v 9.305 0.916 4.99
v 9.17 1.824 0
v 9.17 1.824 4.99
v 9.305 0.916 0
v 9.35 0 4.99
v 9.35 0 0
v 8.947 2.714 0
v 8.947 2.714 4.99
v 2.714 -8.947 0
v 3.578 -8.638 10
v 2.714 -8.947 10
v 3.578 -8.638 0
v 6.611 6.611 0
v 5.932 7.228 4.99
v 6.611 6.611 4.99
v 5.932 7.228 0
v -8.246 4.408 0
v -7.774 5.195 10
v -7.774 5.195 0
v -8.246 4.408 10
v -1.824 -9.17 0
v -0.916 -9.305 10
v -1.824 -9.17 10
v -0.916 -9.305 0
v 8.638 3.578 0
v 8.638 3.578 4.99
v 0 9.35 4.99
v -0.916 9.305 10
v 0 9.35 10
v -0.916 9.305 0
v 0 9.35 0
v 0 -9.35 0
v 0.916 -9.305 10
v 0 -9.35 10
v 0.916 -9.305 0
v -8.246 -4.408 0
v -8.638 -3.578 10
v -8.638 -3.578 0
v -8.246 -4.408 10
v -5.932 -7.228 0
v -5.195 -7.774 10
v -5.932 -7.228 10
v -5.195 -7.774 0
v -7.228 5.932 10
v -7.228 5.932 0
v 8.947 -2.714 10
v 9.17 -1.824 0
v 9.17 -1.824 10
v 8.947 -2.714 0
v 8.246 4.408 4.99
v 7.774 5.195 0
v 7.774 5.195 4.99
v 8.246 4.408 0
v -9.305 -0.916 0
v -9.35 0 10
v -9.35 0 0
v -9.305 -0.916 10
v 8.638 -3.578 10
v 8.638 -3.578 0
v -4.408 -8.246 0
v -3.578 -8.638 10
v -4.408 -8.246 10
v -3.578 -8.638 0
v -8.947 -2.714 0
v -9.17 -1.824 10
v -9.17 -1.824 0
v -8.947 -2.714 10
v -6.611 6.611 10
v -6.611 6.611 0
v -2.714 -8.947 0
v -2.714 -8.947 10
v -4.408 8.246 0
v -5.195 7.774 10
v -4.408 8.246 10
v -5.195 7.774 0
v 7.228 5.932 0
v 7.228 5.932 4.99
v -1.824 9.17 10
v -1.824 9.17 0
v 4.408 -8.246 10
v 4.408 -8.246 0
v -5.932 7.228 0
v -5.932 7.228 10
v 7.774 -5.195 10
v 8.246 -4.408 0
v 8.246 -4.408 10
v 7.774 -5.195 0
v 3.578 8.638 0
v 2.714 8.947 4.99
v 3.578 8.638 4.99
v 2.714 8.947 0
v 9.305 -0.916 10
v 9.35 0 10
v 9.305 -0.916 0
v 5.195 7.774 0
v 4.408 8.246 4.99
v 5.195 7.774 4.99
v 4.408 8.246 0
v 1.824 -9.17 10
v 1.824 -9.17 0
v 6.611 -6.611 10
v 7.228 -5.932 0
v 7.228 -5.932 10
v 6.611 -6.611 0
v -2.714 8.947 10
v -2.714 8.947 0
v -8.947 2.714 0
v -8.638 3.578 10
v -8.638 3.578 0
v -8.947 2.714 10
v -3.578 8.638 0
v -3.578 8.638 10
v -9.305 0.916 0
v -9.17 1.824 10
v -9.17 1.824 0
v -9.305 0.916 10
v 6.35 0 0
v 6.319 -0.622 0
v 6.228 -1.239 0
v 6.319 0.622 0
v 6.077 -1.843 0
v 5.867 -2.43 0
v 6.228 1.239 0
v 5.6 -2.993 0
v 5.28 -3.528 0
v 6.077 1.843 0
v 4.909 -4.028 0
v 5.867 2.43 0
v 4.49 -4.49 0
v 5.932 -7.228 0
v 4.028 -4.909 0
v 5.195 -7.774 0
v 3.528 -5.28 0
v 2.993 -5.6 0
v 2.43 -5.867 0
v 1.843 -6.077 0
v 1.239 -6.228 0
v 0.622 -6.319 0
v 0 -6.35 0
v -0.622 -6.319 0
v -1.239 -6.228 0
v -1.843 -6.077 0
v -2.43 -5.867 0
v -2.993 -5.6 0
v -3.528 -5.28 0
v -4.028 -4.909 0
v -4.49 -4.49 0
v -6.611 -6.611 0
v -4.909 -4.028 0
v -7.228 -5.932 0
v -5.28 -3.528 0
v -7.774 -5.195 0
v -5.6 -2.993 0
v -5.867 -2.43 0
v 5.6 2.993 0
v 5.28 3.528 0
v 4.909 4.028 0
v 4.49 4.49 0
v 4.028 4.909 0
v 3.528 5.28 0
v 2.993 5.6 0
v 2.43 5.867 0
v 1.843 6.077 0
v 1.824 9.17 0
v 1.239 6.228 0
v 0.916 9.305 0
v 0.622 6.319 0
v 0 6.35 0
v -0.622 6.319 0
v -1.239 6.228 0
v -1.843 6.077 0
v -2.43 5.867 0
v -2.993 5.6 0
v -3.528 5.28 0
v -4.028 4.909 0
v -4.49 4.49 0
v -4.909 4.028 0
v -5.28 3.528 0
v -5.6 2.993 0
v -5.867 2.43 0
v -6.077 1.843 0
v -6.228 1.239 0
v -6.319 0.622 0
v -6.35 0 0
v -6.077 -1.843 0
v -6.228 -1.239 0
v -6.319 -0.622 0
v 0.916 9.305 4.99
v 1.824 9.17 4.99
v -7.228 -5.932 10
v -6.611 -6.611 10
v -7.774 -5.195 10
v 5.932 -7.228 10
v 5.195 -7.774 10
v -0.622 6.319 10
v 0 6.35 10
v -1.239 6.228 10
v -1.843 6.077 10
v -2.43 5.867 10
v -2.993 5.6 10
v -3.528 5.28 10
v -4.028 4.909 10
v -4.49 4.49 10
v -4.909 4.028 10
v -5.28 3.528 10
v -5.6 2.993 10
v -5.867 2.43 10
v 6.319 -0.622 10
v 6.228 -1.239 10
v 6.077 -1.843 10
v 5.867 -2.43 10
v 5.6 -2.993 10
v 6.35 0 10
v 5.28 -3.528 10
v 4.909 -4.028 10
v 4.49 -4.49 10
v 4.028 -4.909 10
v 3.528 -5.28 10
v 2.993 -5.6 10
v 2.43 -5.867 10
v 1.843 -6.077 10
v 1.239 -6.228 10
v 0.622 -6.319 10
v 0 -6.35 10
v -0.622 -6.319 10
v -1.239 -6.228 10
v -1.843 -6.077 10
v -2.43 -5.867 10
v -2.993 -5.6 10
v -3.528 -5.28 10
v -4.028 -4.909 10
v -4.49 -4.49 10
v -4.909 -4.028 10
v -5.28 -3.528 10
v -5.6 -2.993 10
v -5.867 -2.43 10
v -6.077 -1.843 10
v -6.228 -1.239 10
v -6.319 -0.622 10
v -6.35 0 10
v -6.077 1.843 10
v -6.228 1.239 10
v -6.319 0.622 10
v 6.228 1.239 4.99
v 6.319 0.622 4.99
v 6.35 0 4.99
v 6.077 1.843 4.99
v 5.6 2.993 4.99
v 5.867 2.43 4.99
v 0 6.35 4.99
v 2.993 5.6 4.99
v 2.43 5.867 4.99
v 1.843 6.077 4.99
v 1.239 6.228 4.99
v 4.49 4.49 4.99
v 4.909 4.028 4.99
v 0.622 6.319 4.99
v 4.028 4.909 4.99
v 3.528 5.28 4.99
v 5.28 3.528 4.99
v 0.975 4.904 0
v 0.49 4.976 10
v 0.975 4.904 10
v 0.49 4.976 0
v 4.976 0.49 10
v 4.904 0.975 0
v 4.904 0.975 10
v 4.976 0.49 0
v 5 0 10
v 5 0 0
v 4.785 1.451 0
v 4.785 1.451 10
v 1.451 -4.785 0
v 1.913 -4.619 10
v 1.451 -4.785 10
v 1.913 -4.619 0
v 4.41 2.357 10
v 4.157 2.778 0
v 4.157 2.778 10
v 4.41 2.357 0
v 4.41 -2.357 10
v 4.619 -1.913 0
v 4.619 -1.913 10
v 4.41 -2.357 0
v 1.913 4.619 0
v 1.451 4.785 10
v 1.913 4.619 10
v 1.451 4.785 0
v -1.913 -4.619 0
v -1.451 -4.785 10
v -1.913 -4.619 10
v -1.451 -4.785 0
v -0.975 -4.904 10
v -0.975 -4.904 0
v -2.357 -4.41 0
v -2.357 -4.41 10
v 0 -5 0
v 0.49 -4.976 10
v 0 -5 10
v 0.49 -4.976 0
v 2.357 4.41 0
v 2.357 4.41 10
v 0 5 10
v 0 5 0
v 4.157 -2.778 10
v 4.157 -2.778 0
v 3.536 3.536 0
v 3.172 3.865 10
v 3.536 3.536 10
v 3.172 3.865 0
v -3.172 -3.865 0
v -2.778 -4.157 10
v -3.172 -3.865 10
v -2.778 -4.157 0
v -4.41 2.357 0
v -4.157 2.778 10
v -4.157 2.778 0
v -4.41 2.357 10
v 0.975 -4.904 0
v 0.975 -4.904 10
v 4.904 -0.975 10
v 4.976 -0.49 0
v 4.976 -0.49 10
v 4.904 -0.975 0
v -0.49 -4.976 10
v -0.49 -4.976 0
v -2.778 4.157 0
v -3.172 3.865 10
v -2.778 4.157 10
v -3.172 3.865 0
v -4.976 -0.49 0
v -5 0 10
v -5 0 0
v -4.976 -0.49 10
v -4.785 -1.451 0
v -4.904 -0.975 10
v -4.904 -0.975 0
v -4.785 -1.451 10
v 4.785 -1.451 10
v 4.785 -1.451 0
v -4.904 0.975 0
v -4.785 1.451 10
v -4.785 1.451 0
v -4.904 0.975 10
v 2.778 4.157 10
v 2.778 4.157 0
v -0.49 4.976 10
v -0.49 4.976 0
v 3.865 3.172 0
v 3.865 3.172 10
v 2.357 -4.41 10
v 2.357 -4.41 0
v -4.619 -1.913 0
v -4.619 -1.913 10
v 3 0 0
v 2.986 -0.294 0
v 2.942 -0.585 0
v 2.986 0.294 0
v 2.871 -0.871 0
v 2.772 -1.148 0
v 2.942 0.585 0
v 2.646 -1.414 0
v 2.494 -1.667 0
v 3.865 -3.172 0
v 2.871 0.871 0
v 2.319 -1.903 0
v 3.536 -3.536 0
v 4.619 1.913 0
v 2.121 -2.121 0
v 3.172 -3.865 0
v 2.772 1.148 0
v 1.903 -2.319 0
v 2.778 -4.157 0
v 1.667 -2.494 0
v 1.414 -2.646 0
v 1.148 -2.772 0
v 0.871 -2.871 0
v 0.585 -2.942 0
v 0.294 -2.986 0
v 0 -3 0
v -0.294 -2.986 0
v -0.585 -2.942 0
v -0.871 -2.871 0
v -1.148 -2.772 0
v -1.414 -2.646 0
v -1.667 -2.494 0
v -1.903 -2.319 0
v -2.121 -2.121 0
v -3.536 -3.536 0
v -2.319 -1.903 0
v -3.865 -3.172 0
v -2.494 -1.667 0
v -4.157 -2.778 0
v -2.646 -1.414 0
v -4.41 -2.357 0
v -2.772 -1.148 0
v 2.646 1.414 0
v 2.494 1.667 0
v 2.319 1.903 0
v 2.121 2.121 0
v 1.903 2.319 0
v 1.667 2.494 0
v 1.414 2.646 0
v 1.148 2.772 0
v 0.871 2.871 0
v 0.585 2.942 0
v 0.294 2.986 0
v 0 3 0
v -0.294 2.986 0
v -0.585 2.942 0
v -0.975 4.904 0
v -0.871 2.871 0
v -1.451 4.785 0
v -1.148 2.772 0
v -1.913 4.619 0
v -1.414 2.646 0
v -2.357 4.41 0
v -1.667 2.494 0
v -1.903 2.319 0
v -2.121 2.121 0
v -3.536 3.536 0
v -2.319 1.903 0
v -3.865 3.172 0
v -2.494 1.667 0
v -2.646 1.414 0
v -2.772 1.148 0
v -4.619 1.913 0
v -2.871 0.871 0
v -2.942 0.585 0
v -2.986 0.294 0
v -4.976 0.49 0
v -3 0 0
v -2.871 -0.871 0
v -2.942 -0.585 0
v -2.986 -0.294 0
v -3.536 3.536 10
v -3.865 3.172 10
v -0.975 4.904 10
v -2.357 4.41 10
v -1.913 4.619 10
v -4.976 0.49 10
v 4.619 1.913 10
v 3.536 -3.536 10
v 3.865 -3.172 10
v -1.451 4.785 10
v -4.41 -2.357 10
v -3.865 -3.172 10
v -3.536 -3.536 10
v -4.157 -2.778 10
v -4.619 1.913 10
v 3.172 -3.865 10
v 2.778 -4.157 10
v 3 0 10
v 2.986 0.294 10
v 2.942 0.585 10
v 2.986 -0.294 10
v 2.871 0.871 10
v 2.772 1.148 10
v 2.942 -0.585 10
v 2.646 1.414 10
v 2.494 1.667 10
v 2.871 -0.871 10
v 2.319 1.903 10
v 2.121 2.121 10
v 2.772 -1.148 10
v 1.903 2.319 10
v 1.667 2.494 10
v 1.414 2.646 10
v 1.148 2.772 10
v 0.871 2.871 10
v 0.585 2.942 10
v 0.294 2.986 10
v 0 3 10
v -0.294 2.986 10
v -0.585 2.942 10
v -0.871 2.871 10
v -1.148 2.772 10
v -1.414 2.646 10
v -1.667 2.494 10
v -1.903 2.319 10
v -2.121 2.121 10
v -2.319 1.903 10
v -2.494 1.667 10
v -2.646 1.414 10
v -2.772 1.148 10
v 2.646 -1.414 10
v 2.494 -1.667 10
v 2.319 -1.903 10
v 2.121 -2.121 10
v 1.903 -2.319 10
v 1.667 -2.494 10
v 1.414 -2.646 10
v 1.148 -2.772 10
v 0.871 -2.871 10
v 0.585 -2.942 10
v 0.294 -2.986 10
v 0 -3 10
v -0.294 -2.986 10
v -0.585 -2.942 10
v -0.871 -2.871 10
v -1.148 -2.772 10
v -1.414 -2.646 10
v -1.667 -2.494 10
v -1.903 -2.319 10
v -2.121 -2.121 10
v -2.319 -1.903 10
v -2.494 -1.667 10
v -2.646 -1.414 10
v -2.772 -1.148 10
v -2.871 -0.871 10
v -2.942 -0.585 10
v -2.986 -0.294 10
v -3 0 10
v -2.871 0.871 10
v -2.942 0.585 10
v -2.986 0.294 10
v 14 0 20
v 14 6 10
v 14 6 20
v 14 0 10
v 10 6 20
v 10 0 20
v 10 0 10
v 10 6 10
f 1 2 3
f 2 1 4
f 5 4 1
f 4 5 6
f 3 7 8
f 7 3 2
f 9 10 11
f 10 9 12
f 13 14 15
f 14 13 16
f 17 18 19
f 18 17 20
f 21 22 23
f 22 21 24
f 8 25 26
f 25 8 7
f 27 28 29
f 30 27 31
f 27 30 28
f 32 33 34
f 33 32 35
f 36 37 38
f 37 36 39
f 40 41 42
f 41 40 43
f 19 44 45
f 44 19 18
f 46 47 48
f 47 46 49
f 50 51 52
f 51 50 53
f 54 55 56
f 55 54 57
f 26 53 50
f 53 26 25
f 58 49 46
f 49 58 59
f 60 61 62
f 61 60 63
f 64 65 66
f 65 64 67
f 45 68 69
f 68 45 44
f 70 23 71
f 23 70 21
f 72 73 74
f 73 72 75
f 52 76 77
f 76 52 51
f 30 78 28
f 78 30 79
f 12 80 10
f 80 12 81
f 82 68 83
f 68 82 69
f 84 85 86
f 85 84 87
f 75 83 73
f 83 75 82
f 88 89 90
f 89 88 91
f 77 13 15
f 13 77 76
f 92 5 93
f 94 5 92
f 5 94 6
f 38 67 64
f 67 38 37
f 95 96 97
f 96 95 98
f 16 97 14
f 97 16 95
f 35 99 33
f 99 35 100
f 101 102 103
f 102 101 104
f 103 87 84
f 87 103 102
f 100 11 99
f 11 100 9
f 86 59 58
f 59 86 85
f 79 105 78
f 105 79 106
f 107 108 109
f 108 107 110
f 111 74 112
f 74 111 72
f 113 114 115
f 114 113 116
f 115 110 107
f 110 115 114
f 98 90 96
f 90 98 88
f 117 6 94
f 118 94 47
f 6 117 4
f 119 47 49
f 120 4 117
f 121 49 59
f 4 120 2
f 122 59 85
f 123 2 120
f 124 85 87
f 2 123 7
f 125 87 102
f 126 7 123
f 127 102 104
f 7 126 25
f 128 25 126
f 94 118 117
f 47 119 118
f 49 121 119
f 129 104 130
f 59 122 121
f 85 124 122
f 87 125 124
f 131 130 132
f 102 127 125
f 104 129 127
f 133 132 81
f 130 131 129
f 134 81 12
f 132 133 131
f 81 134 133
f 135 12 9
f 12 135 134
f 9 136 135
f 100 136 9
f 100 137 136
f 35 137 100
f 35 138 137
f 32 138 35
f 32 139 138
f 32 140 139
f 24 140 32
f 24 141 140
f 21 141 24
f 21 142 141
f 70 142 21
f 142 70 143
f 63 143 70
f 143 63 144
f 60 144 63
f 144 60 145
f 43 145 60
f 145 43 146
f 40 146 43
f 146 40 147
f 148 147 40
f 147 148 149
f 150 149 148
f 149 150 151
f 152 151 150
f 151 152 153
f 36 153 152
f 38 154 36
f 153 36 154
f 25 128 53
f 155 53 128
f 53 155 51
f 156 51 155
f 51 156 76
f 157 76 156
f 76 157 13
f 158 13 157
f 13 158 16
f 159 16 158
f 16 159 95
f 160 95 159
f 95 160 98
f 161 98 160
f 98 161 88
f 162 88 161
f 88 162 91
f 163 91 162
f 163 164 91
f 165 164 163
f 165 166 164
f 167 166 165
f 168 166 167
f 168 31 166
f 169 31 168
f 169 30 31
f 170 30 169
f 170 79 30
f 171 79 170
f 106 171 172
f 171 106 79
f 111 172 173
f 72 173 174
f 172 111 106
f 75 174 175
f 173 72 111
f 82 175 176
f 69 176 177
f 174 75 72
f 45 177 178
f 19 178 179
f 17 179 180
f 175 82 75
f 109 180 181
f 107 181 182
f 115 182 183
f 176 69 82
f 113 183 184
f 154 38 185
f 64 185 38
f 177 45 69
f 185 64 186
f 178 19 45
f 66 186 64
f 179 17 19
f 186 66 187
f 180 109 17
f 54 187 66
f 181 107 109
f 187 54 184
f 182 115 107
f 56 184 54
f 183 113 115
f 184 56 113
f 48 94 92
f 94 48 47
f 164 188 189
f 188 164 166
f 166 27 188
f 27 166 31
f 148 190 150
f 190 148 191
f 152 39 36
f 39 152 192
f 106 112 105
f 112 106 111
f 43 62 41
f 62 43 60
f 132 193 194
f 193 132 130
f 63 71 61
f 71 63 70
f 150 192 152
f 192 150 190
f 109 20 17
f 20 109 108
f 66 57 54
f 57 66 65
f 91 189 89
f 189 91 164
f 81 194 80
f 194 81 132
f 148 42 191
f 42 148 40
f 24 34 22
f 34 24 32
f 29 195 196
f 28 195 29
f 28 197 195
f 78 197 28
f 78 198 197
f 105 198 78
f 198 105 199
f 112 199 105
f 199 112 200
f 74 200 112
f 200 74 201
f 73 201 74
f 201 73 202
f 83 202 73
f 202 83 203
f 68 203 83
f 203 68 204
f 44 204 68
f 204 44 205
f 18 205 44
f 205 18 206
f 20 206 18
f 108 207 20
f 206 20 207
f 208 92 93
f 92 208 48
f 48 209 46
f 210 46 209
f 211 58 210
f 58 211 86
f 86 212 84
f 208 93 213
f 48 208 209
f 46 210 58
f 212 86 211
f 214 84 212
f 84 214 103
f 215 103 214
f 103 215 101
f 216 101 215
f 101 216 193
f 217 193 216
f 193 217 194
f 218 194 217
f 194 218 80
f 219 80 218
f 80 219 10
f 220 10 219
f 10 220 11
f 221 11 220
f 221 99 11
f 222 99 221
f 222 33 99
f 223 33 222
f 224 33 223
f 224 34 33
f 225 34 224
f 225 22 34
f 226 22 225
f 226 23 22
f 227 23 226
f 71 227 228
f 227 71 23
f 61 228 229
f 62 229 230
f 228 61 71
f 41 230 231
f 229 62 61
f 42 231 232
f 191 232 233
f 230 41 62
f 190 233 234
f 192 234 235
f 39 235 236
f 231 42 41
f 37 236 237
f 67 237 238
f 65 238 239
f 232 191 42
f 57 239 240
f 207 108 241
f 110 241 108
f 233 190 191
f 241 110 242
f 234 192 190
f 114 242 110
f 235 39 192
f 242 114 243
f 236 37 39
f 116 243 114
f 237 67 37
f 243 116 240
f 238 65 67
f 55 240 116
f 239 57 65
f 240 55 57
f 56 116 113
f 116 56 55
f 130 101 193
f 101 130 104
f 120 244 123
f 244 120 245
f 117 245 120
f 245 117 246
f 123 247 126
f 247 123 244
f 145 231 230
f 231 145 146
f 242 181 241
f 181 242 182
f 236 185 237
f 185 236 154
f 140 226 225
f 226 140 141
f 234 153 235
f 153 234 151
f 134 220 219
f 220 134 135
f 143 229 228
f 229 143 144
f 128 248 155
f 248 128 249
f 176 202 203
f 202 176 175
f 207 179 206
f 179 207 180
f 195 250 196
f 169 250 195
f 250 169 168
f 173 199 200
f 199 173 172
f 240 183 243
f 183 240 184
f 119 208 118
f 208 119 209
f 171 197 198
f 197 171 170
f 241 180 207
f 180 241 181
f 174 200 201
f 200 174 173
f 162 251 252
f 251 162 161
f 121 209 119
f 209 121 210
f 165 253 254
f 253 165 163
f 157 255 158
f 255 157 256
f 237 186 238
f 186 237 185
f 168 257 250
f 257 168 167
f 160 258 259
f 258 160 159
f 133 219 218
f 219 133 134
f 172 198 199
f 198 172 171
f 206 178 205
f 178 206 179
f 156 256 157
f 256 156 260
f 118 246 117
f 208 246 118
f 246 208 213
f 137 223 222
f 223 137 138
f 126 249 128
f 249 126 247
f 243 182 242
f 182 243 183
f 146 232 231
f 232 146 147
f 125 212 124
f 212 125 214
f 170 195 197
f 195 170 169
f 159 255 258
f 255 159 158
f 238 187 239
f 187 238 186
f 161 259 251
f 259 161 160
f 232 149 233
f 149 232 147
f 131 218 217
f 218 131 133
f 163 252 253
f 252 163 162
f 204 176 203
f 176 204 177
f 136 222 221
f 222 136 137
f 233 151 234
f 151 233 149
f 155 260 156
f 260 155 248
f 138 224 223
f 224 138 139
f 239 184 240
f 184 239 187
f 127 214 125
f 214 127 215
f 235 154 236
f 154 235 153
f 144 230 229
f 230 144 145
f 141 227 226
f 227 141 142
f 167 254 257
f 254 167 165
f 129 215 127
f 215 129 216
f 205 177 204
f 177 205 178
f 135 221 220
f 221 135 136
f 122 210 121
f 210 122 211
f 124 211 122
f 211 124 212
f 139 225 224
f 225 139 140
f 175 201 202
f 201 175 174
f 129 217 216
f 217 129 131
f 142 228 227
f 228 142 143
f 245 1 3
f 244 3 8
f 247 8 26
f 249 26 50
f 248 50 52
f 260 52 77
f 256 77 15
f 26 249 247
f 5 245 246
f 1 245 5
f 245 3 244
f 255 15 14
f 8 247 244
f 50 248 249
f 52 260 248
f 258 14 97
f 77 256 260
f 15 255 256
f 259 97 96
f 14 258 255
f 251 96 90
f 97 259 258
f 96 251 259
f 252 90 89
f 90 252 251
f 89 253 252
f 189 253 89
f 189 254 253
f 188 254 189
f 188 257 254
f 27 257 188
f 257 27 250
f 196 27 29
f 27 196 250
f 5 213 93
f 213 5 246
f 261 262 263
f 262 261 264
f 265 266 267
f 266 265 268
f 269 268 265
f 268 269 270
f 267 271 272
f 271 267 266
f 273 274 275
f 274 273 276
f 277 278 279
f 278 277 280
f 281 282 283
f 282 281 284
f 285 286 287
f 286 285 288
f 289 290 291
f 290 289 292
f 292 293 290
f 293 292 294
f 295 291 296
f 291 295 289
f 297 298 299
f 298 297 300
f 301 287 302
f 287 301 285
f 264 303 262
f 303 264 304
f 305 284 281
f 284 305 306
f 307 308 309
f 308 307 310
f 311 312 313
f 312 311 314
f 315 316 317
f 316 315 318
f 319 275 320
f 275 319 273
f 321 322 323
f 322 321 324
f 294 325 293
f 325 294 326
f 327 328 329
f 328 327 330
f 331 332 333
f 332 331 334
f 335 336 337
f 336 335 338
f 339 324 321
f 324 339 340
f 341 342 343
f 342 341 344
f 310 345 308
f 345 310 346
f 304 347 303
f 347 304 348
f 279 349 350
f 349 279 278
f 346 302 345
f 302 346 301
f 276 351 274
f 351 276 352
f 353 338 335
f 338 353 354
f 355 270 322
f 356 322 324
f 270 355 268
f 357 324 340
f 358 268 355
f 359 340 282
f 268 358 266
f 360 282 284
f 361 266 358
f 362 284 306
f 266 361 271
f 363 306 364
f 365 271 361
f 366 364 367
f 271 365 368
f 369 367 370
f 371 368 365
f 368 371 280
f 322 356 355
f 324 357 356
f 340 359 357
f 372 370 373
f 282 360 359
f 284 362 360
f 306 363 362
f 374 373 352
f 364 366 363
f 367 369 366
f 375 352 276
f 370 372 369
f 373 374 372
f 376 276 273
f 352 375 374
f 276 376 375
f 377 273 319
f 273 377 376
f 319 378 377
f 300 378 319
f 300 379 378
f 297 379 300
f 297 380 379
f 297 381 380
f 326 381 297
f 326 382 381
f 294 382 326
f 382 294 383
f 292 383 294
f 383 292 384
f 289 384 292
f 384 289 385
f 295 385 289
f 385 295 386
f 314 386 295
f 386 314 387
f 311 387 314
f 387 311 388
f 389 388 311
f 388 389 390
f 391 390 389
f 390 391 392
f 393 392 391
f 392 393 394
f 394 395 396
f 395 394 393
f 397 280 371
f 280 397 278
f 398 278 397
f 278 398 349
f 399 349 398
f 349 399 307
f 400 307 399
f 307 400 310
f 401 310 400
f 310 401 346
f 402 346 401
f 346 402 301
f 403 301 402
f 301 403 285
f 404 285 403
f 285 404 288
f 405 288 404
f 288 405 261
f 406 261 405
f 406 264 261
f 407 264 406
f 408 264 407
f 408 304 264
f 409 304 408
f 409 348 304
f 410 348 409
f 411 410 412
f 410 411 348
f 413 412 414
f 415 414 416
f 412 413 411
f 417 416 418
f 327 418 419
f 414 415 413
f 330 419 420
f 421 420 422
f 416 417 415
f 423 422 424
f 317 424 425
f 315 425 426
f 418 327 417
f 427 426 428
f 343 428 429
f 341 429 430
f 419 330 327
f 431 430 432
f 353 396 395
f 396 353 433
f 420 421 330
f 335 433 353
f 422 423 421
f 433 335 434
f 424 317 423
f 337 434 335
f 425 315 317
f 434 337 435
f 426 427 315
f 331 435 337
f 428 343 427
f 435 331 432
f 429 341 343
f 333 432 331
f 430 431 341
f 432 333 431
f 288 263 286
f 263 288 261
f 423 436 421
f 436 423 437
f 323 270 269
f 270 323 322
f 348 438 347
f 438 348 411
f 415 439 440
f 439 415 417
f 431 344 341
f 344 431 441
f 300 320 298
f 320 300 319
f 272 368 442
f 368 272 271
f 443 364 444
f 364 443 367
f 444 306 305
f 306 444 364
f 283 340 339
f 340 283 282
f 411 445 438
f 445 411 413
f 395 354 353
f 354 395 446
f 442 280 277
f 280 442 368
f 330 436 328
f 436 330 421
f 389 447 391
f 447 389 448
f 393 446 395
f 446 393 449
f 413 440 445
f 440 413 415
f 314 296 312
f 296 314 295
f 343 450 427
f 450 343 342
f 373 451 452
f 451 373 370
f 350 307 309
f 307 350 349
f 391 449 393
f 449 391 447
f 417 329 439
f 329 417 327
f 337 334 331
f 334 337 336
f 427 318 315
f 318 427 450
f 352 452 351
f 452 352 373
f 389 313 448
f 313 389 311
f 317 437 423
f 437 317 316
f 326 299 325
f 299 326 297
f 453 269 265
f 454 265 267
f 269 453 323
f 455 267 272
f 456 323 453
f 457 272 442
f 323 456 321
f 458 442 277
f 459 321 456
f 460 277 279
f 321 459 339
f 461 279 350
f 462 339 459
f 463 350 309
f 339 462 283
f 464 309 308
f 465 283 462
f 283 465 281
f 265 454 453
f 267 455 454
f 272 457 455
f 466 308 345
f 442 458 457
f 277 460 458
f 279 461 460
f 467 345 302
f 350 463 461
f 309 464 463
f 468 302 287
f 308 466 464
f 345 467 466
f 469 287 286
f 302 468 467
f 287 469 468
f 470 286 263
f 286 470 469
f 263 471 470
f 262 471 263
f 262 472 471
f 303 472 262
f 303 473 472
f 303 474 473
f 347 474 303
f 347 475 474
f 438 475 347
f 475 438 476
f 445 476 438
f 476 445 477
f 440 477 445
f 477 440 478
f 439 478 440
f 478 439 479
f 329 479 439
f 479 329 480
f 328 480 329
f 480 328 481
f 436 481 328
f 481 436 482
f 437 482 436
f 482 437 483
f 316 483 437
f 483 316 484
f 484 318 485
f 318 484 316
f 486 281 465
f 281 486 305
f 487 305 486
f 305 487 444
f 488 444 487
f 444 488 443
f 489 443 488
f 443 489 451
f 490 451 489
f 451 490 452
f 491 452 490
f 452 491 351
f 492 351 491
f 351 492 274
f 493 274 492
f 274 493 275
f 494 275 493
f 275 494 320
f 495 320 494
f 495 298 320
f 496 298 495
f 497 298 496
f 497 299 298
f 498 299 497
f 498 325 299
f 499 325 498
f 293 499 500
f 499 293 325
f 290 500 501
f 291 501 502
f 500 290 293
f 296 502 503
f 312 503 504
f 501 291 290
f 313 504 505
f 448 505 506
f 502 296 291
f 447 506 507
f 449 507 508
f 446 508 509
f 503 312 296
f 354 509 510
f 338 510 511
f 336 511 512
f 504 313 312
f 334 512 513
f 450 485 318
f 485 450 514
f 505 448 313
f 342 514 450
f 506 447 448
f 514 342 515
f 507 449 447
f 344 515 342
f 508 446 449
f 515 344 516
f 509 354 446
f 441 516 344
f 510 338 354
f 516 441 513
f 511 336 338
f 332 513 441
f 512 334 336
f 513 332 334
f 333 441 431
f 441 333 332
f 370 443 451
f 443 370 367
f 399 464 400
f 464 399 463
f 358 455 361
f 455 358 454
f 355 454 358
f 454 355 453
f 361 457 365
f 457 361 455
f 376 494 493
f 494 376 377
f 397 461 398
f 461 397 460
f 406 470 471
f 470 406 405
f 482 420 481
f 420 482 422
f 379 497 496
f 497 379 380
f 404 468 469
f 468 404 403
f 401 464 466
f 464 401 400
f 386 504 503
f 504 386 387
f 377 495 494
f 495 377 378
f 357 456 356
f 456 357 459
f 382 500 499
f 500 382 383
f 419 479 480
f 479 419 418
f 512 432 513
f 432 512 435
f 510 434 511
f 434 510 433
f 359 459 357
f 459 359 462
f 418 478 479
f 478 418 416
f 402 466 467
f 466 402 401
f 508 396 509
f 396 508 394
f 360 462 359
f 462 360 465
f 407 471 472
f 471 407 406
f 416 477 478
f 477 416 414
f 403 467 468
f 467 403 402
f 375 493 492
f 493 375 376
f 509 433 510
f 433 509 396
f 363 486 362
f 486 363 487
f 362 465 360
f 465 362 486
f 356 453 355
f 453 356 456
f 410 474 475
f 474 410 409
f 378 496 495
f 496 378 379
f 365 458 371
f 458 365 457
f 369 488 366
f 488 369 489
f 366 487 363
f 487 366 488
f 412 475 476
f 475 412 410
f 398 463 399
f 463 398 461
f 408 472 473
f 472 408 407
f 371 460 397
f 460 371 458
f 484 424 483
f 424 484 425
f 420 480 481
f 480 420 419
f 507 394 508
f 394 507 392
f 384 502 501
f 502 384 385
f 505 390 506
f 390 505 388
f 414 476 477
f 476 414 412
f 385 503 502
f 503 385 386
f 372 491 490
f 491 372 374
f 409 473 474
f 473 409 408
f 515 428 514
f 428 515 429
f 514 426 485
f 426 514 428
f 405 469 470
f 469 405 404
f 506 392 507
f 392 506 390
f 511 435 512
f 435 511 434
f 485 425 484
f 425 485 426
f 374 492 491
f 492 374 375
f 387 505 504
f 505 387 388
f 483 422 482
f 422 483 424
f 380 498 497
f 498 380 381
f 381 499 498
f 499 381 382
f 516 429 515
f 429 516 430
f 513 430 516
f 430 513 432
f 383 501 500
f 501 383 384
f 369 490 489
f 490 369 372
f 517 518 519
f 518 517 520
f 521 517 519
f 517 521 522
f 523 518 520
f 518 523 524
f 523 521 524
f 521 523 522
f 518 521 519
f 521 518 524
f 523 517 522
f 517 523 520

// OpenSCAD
$fn = 64;

// Dimensions
rod_diameter = 12.7;           // Inner diameter of rod ring
rod_wall = 3;                 // Wall thickness of rod ring
rod_outer_diameter = rod_diameter + 2 * rod_wall;  // 18.7 mm

tubing_inner_diameter = 6;  // Inner diameter of tubing ring
tubing_wall = 2;              // Wall thickness of tubing ring
tubing_outer_diameter = tubing_inner_diameter + 2 * tubing_wall;  // 10 mm

bridge_width_y = 6;           // Width of bridge in Y direction
bridge_start_x = 8;           // Start X of bridge
bridge_end_x = 12;            // End X of bridge

// Rod ring: centered at origin, with -X side opening
rod_ring_inner_radius = rod_diameter / 2;
rod_ring_outer_radius = rod_outer_diameter / 2;

// Tubing ring: centered at (15, 0), with +X side opening
tubing_ring_center_x = 15;
tubing_ring_center_y = 0;
tubing_ring_inner_radius = tubing_inner_diameter / 2;
tubing_ring_outer_radius = tubing_outer_diameter / 2;

// Opening dimensions
rod_opening_width = 10;     // Width of opening in rod ring (-X side)
rod_opening_half_y = rod_opening_width / 2;  // -5 to +5

tubing_opening_width = 4.5;    // Width of opening in tubing ring (+X side)
tubing_opening_half_y = tubing_opening_width / 2;  // -2.25 to +2.25

// Bridge: solid connection between rings, 6 mm wide in Y, from x=8 to x=12
bridge_y_min = -bridge_width_y / 2;
bridge_y_max = bridge_width_y / 2;

// Correct the orientation: the entire part must be printed flat on the bed at z = 0,
// with the bottom at z = 0 and height 10 mm (z = 0 to z = 10).
// The original model was centered at z = 0 (from -5 to +5), so we need to shift it up by 5 mm.
// However, the bridge and rings must be aligned properly in X and Y.

// Build the clip with correct vertical positioning: shift entire model up by 5 mm so that z = 0 is the bottom.
// The total height is 10 mm, so we want the bottom at z = 0 and top at z = 10.

module clip() {
    // Rod ring with -X side opening
    difference() {
        // Outer ring (full circle)
        cylinder(h = 10, r = rod_ring_outer_radius, center = true);
        // Inner hole (full circle)
        cylinder(h = 10, r = rod_ring_inner_radius, center = true);
        // Cut out the opening: a rectangle from x = -rod_ring_outer_radius to x = 0, y = -5 to 5
        // Use a slightly larger rectangle to ensure full removal (0.01 mm past face)
        translate([0, 0, -0.01])
        cube([rod_ring_outer_radius * 2 + 0.02, rod_opening_width + 0.02, 10.02], center = false);
    }

    // Tubing ring with +X side opening
    difference() {
        // Outer ring (full circle)
        cylinder(h = 10, r = tubing_ring_outer_radius, center = true);
        // Inner hole (full circle)
        cylinder(h = 10, r = tubing_ring_inner_radius, center = true);
        // Cut out the opening: a rectangle from x = 15 to x = 15 + tubing_ring_outer_radius, y = -2.25 to 2.25
        // Use a slightly larger rectangle to ensure full removal
        translate([tubing_ring_center_x, 0, -0.01])
        cube([tubing_ring_outer_radius * 2 + 0.02, tubing_opening_width + 0.02, 10.02], center = false);
    }

    // Bridge: solid rectangle connecting the two rings
    // From x = 8 to 12, y = -3 to 3 (6 mm wide), z = 0 to 10
    // Must be placed at z = 0 to 10, so we center it at z = 5
    translate([bridge_start_x + (bridge_end_x - bridge_start_x)/2, 0, 5])
    cube([bridge_end_x - bridge_start_x, bridge_width_y, 10], center = false);
}

// The entire model is currently centered at z = 0 (from -5 to +5), so we need to shift it up by 5 mm
// to place the bottom at z = 0.
// Apply the vertical shift only once, to the entire clip.
translate([0, 0, 5])
clip();
